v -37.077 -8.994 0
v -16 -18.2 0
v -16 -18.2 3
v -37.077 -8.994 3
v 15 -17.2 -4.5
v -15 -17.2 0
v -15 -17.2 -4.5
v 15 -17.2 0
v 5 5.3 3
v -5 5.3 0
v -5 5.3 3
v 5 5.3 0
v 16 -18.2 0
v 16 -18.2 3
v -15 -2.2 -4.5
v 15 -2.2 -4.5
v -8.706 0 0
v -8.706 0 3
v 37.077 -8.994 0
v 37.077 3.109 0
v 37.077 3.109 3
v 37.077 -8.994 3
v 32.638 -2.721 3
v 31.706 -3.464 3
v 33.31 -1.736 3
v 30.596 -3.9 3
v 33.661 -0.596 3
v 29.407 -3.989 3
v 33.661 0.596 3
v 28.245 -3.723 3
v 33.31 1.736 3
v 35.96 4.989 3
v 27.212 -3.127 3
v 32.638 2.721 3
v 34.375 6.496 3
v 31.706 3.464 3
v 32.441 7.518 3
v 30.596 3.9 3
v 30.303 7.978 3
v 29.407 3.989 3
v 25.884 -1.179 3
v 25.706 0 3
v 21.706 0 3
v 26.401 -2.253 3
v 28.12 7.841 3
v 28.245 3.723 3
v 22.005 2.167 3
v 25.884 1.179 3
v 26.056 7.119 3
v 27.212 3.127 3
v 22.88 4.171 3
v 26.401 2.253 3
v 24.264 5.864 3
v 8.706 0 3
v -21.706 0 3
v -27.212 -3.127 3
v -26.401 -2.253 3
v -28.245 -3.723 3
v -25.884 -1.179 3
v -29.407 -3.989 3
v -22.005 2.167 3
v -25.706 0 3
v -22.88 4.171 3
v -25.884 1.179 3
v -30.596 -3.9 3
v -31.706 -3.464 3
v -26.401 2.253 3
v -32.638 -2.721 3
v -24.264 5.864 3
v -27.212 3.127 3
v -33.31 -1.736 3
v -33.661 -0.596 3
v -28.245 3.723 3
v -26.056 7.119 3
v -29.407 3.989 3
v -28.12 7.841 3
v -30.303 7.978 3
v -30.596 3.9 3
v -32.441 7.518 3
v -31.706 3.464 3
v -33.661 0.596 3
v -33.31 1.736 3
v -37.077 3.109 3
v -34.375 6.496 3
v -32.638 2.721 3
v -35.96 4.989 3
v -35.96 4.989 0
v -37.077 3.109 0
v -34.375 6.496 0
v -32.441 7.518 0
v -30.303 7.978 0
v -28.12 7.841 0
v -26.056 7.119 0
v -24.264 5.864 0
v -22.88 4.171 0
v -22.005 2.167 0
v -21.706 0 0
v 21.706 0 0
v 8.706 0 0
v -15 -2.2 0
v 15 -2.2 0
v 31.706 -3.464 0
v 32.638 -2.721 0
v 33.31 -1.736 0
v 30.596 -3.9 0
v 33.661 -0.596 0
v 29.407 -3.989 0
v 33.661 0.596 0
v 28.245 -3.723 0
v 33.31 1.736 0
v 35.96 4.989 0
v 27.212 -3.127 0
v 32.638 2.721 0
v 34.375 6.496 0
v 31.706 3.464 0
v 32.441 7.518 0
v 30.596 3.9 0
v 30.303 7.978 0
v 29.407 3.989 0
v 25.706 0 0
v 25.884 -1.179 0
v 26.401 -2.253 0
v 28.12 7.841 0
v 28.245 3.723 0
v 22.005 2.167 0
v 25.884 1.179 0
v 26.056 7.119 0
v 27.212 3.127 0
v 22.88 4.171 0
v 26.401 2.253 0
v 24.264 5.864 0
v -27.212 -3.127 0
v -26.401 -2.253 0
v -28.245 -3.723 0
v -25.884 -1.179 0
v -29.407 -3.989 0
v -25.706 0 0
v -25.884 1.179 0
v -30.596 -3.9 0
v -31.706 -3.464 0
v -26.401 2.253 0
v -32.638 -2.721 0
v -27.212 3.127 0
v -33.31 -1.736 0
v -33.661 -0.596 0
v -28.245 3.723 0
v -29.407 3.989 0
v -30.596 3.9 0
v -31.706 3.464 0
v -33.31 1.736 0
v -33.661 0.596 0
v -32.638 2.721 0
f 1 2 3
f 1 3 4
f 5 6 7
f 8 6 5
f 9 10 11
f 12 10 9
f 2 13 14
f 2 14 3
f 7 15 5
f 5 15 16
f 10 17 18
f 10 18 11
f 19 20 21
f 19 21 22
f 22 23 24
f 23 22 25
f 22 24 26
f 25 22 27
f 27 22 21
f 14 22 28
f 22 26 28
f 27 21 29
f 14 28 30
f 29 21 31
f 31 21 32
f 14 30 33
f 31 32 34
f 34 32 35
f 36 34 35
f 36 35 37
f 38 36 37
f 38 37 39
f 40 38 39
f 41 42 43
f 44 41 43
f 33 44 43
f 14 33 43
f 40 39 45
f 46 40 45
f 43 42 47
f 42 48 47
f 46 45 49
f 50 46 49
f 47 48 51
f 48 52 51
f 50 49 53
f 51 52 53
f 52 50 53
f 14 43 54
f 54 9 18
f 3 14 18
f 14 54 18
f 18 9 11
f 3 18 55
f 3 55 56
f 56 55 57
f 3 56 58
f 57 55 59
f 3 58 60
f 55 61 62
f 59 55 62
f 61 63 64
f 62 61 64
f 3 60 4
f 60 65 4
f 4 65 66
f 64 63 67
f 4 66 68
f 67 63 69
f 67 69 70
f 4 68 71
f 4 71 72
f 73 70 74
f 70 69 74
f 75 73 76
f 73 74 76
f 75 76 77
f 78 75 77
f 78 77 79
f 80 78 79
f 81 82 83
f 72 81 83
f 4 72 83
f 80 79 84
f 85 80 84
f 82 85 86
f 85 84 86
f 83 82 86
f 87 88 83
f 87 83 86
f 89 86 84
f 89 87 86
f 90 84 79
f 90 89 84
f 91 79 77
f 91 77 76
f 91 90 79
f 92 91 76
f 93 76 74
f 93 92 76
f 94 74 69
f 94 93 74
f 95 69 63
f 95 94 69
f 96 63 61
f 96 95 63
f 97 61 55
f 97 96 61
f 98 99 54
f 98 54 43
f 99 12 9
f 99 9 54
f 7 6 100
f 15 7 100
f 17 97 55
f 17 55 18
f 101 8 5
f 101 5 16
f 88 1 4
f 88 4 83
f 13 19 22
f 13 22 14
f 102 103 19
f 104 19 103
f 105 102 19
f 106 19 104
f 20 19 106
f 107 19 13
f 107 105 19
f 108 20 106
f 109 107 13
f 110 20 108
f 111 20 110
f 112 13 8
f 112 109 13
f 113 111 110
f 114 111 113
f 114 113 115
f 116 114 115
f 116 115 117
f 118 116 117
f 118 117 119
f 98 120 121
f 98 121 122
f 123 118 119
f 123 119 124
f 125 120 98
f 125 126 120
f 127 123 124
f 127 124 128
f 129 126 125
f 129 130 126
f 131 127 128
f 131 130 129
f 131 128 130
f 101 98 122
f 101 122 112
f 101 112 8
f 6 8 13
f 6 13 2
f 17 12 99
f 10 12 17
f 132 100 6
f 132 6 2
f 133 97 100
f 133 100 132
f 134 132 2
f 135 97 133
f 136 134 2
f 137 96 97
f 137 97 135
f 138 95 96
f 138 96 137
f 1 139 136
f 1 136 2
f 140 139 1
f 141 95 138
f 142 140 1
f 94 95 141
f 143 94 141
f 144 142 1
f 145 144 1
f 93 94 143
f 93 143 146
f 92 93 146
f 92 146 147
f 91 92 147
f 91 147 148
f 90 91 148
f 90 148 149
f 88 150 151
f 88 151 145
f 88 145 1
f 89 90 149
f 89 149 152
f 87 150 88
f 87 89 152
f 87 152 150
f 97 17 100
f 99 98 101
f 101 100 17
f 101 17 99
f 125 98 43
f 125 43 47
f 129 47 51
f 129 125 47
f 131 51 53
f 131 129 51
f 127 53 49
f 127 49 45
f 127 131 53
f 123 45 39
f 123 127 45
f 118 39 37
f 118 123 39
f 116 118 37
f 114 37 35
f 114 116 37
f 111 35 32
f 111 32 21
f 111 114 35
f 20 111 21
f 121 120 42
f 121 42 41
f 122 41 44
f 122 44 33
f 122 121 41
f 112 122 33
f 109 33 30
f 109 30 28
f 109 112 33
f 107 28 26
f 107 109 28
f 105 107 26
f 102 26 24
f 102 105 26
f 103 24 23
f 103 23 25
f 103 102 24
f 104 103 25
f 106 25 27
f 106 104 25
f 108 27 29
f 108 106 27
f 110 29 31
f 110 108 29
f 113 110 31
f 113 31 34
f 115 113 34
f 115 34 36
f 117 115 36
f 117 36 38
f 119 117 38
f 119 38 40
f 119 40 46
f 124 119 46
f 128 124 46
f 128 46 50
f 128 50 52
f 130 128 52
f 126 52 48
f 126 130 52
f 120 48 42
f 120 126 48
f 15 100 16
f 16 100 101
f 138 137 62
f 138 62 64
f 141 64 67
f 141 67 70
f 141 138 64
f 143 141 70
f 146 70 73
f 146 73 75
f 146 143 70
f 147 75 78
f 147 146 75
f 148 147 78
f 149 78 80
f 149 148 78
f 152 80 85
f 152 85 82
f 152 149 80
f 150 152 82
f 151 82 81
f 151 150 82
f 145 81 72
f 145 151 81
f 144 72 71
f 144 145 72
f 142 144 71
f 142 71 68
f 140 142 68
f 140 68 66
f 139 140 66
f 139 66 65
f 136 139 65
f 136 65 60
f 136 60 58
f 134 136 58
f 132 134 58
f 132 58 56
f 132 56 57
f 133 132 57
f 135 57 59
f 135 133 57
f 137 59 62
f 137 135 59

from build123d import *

# Parameters (mm, degrees)
SKETCH1_R           = 4
BOSS_EXTRUDE1_DEPTH = 3
SKETCH2_W           = 30
SKETCH2_H           = 15
BOSS_EXTRUDE2_DEPTH = 4.5


with BuildPart() as part:
    # Sketch1 → Boss-Extrude1 (new body)
    with BuildSketch(Plane.XY):
        with BuildLine():
            Line((-21.706018243, 0), (-8.706018243, 0))
            Line((-8.706018243, 0), (-5, 5.3))
            Line((-5, 5.3), (5, 5.3))
            Line((5, 5.3), (8.706018243, 0))
            Line((8.706018243, 0), (21.706018243, 0))
            ThreePointArc((21.706018243, 0), (28.120289405, 7.841266738), (37.077384256, 3.108530697))
            Line((37.077384256, 3.108530697), (37.077384256, -8.994356464))
            Line((37.077384256, -8.994356464), (16, -18.2))
            Line((16, -18.2), (-16, -18.2))
            Line((-16, -18.2), (-37.077384256, -8.994356464))
            Line((-37.077384256, -8.994356464), (-37.077384256, 3.108530697))
            ThreePointArc((-37.077384256, 3.108530697), (-28.120289405, 7.841266738), (-21.706018243, 0))
        make_face()
        with Locations((-29.706018243, 0)):
            Circle(SKETCH1_R, mode=Mode.SUBTRACT)
        with Locations(Location((29.706018243, 0, 0), (0, 0, 180))):
            Circle(SKETCH1_R, mode=Mode.SUBTRACT)
    extrude(amount=BOSS_EXTRUDE1_DEPTH)

    # Sketch2 → Boss-Extrude2 (add)
    with BuildSketch(Plane.XY):
        with Locations((0, -9.7)):
            Rectangle(SKETCH2_W, SKETCH2_H)
    extrude(amount=-BOSS_EXTRUDE2_DEPTH)


solid = part.part
